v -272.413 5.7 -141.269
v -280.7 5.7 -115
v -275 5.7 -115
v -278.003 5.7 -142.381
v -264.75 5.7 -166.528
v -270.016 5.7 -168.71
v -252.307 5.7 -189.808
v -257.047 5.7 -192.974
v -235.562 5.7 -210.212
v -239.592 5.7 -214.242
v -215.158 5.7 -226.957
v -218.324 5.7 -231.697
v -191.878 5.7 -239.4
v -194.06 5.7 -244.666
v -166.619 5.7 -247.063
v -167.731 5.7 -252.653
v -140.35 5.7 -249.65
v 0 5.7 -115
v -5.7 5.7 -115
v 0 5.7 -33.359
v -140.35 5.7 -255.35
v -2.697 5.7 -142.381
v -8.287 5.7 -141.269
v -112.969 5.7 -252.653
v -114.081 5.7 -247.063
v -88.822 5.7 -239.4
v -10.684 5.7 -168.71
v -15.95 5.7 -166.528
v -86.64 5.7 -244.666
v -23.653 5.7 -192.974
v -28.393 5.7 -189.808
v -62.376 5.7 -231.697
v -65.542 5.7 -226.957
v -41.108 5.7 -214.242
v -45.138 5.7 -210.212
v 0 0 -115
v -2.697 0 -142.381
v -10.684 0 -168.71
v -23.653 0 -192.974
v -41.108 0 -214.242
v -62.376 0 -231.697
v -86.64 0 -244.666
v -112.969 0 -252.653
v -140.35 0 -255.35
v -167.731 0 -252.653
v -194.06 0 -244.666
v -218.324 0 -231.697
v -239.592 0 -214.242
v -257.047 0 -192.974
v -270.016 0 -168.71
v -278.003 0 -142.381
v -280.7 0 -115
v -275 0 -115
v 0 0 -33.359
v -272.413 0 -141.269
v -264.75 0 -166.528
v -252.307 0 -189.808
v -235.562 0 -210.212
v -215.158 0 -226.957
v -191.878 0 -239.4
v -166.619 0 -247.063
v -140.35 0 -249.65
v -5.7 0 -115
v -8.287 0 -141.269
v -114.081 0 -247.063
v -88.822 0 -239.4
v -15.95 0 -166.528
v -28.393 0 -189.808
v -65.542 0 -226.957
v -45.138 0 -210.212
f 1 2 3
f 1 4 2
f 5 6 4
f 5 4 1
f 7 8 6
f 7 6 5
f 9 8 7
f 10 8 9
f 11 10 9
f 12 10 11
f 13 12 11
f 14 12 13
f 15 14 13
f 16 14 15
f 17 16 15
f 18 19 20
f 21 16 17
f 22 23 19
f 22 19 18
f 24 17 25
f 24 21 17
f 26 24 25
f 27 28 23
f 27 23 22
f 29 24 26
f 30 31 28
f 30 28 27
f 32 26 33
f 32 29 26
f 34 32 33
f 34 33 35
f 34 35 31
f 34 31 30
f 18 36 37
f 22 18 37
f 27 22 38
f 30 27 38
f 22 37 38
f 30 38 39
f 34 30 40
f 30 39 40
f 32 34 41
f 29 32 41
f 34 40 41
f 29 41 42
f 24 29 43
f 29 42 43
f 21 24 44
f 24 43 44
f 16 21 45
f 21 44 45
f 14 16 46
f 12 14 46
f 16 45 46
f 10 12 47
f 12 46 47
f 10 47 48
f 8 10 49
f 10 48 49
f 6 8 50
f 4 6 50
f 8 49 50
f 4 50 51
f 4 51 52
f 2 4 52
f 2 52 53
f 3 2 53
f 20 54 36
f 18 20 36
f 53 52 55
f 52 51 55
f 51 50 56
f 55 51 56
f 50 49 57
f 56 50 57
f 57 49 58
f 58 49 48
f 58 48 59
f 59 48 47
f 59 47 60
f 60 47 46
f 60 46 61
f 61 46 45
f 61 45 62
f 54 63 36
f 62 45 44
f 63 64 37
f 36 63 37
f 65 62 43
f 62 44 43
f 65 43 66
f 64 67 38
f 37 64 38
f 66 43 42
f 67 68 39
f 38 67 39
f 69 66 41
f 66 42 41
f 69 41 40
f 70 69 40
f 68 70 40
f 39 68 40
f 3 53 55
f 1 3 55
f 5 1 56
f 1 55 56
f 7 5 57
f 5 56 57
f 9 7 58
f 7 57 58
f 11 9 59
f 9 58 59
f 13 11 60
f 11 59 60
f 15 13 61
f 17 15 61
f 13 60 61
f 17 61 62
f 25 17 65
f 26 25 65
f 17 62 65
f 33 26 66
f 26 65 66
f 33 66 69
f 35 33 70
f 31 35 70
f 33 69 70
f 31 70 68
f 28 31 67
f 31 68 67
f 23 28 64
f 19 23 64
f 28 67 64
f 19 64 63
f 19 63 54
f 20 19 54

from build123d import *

# Parameters (mm, degrees)
BOSS_EXTRUDE1_DEPTH = 5.7


with BuildPart() as part:
    # Sketch1 → Boss-Extrude1 (new body)
    with BuildSketch(Plane(origin=(0, 0, 0), x_dir=(1, 0, 0), z_dir=(0, 1, 0))):
        with BuildLine():
            Line((-280.7, 115), (-275, 115))
            ThreePointArc((-275, 115), (-140.35, 249.65), (-5.7, 115))
            Line((-5.7, 115), (0, 33.358770855))
            Line((0, 33.358770855), (0, 115))
            ThreePointArc((0, 115), (-140.35, 255.35), (-280.7, 115))
        make_face()
    extrude(amount=BOSS_EXTRUDE1_DEPTH)


solid = part.part
